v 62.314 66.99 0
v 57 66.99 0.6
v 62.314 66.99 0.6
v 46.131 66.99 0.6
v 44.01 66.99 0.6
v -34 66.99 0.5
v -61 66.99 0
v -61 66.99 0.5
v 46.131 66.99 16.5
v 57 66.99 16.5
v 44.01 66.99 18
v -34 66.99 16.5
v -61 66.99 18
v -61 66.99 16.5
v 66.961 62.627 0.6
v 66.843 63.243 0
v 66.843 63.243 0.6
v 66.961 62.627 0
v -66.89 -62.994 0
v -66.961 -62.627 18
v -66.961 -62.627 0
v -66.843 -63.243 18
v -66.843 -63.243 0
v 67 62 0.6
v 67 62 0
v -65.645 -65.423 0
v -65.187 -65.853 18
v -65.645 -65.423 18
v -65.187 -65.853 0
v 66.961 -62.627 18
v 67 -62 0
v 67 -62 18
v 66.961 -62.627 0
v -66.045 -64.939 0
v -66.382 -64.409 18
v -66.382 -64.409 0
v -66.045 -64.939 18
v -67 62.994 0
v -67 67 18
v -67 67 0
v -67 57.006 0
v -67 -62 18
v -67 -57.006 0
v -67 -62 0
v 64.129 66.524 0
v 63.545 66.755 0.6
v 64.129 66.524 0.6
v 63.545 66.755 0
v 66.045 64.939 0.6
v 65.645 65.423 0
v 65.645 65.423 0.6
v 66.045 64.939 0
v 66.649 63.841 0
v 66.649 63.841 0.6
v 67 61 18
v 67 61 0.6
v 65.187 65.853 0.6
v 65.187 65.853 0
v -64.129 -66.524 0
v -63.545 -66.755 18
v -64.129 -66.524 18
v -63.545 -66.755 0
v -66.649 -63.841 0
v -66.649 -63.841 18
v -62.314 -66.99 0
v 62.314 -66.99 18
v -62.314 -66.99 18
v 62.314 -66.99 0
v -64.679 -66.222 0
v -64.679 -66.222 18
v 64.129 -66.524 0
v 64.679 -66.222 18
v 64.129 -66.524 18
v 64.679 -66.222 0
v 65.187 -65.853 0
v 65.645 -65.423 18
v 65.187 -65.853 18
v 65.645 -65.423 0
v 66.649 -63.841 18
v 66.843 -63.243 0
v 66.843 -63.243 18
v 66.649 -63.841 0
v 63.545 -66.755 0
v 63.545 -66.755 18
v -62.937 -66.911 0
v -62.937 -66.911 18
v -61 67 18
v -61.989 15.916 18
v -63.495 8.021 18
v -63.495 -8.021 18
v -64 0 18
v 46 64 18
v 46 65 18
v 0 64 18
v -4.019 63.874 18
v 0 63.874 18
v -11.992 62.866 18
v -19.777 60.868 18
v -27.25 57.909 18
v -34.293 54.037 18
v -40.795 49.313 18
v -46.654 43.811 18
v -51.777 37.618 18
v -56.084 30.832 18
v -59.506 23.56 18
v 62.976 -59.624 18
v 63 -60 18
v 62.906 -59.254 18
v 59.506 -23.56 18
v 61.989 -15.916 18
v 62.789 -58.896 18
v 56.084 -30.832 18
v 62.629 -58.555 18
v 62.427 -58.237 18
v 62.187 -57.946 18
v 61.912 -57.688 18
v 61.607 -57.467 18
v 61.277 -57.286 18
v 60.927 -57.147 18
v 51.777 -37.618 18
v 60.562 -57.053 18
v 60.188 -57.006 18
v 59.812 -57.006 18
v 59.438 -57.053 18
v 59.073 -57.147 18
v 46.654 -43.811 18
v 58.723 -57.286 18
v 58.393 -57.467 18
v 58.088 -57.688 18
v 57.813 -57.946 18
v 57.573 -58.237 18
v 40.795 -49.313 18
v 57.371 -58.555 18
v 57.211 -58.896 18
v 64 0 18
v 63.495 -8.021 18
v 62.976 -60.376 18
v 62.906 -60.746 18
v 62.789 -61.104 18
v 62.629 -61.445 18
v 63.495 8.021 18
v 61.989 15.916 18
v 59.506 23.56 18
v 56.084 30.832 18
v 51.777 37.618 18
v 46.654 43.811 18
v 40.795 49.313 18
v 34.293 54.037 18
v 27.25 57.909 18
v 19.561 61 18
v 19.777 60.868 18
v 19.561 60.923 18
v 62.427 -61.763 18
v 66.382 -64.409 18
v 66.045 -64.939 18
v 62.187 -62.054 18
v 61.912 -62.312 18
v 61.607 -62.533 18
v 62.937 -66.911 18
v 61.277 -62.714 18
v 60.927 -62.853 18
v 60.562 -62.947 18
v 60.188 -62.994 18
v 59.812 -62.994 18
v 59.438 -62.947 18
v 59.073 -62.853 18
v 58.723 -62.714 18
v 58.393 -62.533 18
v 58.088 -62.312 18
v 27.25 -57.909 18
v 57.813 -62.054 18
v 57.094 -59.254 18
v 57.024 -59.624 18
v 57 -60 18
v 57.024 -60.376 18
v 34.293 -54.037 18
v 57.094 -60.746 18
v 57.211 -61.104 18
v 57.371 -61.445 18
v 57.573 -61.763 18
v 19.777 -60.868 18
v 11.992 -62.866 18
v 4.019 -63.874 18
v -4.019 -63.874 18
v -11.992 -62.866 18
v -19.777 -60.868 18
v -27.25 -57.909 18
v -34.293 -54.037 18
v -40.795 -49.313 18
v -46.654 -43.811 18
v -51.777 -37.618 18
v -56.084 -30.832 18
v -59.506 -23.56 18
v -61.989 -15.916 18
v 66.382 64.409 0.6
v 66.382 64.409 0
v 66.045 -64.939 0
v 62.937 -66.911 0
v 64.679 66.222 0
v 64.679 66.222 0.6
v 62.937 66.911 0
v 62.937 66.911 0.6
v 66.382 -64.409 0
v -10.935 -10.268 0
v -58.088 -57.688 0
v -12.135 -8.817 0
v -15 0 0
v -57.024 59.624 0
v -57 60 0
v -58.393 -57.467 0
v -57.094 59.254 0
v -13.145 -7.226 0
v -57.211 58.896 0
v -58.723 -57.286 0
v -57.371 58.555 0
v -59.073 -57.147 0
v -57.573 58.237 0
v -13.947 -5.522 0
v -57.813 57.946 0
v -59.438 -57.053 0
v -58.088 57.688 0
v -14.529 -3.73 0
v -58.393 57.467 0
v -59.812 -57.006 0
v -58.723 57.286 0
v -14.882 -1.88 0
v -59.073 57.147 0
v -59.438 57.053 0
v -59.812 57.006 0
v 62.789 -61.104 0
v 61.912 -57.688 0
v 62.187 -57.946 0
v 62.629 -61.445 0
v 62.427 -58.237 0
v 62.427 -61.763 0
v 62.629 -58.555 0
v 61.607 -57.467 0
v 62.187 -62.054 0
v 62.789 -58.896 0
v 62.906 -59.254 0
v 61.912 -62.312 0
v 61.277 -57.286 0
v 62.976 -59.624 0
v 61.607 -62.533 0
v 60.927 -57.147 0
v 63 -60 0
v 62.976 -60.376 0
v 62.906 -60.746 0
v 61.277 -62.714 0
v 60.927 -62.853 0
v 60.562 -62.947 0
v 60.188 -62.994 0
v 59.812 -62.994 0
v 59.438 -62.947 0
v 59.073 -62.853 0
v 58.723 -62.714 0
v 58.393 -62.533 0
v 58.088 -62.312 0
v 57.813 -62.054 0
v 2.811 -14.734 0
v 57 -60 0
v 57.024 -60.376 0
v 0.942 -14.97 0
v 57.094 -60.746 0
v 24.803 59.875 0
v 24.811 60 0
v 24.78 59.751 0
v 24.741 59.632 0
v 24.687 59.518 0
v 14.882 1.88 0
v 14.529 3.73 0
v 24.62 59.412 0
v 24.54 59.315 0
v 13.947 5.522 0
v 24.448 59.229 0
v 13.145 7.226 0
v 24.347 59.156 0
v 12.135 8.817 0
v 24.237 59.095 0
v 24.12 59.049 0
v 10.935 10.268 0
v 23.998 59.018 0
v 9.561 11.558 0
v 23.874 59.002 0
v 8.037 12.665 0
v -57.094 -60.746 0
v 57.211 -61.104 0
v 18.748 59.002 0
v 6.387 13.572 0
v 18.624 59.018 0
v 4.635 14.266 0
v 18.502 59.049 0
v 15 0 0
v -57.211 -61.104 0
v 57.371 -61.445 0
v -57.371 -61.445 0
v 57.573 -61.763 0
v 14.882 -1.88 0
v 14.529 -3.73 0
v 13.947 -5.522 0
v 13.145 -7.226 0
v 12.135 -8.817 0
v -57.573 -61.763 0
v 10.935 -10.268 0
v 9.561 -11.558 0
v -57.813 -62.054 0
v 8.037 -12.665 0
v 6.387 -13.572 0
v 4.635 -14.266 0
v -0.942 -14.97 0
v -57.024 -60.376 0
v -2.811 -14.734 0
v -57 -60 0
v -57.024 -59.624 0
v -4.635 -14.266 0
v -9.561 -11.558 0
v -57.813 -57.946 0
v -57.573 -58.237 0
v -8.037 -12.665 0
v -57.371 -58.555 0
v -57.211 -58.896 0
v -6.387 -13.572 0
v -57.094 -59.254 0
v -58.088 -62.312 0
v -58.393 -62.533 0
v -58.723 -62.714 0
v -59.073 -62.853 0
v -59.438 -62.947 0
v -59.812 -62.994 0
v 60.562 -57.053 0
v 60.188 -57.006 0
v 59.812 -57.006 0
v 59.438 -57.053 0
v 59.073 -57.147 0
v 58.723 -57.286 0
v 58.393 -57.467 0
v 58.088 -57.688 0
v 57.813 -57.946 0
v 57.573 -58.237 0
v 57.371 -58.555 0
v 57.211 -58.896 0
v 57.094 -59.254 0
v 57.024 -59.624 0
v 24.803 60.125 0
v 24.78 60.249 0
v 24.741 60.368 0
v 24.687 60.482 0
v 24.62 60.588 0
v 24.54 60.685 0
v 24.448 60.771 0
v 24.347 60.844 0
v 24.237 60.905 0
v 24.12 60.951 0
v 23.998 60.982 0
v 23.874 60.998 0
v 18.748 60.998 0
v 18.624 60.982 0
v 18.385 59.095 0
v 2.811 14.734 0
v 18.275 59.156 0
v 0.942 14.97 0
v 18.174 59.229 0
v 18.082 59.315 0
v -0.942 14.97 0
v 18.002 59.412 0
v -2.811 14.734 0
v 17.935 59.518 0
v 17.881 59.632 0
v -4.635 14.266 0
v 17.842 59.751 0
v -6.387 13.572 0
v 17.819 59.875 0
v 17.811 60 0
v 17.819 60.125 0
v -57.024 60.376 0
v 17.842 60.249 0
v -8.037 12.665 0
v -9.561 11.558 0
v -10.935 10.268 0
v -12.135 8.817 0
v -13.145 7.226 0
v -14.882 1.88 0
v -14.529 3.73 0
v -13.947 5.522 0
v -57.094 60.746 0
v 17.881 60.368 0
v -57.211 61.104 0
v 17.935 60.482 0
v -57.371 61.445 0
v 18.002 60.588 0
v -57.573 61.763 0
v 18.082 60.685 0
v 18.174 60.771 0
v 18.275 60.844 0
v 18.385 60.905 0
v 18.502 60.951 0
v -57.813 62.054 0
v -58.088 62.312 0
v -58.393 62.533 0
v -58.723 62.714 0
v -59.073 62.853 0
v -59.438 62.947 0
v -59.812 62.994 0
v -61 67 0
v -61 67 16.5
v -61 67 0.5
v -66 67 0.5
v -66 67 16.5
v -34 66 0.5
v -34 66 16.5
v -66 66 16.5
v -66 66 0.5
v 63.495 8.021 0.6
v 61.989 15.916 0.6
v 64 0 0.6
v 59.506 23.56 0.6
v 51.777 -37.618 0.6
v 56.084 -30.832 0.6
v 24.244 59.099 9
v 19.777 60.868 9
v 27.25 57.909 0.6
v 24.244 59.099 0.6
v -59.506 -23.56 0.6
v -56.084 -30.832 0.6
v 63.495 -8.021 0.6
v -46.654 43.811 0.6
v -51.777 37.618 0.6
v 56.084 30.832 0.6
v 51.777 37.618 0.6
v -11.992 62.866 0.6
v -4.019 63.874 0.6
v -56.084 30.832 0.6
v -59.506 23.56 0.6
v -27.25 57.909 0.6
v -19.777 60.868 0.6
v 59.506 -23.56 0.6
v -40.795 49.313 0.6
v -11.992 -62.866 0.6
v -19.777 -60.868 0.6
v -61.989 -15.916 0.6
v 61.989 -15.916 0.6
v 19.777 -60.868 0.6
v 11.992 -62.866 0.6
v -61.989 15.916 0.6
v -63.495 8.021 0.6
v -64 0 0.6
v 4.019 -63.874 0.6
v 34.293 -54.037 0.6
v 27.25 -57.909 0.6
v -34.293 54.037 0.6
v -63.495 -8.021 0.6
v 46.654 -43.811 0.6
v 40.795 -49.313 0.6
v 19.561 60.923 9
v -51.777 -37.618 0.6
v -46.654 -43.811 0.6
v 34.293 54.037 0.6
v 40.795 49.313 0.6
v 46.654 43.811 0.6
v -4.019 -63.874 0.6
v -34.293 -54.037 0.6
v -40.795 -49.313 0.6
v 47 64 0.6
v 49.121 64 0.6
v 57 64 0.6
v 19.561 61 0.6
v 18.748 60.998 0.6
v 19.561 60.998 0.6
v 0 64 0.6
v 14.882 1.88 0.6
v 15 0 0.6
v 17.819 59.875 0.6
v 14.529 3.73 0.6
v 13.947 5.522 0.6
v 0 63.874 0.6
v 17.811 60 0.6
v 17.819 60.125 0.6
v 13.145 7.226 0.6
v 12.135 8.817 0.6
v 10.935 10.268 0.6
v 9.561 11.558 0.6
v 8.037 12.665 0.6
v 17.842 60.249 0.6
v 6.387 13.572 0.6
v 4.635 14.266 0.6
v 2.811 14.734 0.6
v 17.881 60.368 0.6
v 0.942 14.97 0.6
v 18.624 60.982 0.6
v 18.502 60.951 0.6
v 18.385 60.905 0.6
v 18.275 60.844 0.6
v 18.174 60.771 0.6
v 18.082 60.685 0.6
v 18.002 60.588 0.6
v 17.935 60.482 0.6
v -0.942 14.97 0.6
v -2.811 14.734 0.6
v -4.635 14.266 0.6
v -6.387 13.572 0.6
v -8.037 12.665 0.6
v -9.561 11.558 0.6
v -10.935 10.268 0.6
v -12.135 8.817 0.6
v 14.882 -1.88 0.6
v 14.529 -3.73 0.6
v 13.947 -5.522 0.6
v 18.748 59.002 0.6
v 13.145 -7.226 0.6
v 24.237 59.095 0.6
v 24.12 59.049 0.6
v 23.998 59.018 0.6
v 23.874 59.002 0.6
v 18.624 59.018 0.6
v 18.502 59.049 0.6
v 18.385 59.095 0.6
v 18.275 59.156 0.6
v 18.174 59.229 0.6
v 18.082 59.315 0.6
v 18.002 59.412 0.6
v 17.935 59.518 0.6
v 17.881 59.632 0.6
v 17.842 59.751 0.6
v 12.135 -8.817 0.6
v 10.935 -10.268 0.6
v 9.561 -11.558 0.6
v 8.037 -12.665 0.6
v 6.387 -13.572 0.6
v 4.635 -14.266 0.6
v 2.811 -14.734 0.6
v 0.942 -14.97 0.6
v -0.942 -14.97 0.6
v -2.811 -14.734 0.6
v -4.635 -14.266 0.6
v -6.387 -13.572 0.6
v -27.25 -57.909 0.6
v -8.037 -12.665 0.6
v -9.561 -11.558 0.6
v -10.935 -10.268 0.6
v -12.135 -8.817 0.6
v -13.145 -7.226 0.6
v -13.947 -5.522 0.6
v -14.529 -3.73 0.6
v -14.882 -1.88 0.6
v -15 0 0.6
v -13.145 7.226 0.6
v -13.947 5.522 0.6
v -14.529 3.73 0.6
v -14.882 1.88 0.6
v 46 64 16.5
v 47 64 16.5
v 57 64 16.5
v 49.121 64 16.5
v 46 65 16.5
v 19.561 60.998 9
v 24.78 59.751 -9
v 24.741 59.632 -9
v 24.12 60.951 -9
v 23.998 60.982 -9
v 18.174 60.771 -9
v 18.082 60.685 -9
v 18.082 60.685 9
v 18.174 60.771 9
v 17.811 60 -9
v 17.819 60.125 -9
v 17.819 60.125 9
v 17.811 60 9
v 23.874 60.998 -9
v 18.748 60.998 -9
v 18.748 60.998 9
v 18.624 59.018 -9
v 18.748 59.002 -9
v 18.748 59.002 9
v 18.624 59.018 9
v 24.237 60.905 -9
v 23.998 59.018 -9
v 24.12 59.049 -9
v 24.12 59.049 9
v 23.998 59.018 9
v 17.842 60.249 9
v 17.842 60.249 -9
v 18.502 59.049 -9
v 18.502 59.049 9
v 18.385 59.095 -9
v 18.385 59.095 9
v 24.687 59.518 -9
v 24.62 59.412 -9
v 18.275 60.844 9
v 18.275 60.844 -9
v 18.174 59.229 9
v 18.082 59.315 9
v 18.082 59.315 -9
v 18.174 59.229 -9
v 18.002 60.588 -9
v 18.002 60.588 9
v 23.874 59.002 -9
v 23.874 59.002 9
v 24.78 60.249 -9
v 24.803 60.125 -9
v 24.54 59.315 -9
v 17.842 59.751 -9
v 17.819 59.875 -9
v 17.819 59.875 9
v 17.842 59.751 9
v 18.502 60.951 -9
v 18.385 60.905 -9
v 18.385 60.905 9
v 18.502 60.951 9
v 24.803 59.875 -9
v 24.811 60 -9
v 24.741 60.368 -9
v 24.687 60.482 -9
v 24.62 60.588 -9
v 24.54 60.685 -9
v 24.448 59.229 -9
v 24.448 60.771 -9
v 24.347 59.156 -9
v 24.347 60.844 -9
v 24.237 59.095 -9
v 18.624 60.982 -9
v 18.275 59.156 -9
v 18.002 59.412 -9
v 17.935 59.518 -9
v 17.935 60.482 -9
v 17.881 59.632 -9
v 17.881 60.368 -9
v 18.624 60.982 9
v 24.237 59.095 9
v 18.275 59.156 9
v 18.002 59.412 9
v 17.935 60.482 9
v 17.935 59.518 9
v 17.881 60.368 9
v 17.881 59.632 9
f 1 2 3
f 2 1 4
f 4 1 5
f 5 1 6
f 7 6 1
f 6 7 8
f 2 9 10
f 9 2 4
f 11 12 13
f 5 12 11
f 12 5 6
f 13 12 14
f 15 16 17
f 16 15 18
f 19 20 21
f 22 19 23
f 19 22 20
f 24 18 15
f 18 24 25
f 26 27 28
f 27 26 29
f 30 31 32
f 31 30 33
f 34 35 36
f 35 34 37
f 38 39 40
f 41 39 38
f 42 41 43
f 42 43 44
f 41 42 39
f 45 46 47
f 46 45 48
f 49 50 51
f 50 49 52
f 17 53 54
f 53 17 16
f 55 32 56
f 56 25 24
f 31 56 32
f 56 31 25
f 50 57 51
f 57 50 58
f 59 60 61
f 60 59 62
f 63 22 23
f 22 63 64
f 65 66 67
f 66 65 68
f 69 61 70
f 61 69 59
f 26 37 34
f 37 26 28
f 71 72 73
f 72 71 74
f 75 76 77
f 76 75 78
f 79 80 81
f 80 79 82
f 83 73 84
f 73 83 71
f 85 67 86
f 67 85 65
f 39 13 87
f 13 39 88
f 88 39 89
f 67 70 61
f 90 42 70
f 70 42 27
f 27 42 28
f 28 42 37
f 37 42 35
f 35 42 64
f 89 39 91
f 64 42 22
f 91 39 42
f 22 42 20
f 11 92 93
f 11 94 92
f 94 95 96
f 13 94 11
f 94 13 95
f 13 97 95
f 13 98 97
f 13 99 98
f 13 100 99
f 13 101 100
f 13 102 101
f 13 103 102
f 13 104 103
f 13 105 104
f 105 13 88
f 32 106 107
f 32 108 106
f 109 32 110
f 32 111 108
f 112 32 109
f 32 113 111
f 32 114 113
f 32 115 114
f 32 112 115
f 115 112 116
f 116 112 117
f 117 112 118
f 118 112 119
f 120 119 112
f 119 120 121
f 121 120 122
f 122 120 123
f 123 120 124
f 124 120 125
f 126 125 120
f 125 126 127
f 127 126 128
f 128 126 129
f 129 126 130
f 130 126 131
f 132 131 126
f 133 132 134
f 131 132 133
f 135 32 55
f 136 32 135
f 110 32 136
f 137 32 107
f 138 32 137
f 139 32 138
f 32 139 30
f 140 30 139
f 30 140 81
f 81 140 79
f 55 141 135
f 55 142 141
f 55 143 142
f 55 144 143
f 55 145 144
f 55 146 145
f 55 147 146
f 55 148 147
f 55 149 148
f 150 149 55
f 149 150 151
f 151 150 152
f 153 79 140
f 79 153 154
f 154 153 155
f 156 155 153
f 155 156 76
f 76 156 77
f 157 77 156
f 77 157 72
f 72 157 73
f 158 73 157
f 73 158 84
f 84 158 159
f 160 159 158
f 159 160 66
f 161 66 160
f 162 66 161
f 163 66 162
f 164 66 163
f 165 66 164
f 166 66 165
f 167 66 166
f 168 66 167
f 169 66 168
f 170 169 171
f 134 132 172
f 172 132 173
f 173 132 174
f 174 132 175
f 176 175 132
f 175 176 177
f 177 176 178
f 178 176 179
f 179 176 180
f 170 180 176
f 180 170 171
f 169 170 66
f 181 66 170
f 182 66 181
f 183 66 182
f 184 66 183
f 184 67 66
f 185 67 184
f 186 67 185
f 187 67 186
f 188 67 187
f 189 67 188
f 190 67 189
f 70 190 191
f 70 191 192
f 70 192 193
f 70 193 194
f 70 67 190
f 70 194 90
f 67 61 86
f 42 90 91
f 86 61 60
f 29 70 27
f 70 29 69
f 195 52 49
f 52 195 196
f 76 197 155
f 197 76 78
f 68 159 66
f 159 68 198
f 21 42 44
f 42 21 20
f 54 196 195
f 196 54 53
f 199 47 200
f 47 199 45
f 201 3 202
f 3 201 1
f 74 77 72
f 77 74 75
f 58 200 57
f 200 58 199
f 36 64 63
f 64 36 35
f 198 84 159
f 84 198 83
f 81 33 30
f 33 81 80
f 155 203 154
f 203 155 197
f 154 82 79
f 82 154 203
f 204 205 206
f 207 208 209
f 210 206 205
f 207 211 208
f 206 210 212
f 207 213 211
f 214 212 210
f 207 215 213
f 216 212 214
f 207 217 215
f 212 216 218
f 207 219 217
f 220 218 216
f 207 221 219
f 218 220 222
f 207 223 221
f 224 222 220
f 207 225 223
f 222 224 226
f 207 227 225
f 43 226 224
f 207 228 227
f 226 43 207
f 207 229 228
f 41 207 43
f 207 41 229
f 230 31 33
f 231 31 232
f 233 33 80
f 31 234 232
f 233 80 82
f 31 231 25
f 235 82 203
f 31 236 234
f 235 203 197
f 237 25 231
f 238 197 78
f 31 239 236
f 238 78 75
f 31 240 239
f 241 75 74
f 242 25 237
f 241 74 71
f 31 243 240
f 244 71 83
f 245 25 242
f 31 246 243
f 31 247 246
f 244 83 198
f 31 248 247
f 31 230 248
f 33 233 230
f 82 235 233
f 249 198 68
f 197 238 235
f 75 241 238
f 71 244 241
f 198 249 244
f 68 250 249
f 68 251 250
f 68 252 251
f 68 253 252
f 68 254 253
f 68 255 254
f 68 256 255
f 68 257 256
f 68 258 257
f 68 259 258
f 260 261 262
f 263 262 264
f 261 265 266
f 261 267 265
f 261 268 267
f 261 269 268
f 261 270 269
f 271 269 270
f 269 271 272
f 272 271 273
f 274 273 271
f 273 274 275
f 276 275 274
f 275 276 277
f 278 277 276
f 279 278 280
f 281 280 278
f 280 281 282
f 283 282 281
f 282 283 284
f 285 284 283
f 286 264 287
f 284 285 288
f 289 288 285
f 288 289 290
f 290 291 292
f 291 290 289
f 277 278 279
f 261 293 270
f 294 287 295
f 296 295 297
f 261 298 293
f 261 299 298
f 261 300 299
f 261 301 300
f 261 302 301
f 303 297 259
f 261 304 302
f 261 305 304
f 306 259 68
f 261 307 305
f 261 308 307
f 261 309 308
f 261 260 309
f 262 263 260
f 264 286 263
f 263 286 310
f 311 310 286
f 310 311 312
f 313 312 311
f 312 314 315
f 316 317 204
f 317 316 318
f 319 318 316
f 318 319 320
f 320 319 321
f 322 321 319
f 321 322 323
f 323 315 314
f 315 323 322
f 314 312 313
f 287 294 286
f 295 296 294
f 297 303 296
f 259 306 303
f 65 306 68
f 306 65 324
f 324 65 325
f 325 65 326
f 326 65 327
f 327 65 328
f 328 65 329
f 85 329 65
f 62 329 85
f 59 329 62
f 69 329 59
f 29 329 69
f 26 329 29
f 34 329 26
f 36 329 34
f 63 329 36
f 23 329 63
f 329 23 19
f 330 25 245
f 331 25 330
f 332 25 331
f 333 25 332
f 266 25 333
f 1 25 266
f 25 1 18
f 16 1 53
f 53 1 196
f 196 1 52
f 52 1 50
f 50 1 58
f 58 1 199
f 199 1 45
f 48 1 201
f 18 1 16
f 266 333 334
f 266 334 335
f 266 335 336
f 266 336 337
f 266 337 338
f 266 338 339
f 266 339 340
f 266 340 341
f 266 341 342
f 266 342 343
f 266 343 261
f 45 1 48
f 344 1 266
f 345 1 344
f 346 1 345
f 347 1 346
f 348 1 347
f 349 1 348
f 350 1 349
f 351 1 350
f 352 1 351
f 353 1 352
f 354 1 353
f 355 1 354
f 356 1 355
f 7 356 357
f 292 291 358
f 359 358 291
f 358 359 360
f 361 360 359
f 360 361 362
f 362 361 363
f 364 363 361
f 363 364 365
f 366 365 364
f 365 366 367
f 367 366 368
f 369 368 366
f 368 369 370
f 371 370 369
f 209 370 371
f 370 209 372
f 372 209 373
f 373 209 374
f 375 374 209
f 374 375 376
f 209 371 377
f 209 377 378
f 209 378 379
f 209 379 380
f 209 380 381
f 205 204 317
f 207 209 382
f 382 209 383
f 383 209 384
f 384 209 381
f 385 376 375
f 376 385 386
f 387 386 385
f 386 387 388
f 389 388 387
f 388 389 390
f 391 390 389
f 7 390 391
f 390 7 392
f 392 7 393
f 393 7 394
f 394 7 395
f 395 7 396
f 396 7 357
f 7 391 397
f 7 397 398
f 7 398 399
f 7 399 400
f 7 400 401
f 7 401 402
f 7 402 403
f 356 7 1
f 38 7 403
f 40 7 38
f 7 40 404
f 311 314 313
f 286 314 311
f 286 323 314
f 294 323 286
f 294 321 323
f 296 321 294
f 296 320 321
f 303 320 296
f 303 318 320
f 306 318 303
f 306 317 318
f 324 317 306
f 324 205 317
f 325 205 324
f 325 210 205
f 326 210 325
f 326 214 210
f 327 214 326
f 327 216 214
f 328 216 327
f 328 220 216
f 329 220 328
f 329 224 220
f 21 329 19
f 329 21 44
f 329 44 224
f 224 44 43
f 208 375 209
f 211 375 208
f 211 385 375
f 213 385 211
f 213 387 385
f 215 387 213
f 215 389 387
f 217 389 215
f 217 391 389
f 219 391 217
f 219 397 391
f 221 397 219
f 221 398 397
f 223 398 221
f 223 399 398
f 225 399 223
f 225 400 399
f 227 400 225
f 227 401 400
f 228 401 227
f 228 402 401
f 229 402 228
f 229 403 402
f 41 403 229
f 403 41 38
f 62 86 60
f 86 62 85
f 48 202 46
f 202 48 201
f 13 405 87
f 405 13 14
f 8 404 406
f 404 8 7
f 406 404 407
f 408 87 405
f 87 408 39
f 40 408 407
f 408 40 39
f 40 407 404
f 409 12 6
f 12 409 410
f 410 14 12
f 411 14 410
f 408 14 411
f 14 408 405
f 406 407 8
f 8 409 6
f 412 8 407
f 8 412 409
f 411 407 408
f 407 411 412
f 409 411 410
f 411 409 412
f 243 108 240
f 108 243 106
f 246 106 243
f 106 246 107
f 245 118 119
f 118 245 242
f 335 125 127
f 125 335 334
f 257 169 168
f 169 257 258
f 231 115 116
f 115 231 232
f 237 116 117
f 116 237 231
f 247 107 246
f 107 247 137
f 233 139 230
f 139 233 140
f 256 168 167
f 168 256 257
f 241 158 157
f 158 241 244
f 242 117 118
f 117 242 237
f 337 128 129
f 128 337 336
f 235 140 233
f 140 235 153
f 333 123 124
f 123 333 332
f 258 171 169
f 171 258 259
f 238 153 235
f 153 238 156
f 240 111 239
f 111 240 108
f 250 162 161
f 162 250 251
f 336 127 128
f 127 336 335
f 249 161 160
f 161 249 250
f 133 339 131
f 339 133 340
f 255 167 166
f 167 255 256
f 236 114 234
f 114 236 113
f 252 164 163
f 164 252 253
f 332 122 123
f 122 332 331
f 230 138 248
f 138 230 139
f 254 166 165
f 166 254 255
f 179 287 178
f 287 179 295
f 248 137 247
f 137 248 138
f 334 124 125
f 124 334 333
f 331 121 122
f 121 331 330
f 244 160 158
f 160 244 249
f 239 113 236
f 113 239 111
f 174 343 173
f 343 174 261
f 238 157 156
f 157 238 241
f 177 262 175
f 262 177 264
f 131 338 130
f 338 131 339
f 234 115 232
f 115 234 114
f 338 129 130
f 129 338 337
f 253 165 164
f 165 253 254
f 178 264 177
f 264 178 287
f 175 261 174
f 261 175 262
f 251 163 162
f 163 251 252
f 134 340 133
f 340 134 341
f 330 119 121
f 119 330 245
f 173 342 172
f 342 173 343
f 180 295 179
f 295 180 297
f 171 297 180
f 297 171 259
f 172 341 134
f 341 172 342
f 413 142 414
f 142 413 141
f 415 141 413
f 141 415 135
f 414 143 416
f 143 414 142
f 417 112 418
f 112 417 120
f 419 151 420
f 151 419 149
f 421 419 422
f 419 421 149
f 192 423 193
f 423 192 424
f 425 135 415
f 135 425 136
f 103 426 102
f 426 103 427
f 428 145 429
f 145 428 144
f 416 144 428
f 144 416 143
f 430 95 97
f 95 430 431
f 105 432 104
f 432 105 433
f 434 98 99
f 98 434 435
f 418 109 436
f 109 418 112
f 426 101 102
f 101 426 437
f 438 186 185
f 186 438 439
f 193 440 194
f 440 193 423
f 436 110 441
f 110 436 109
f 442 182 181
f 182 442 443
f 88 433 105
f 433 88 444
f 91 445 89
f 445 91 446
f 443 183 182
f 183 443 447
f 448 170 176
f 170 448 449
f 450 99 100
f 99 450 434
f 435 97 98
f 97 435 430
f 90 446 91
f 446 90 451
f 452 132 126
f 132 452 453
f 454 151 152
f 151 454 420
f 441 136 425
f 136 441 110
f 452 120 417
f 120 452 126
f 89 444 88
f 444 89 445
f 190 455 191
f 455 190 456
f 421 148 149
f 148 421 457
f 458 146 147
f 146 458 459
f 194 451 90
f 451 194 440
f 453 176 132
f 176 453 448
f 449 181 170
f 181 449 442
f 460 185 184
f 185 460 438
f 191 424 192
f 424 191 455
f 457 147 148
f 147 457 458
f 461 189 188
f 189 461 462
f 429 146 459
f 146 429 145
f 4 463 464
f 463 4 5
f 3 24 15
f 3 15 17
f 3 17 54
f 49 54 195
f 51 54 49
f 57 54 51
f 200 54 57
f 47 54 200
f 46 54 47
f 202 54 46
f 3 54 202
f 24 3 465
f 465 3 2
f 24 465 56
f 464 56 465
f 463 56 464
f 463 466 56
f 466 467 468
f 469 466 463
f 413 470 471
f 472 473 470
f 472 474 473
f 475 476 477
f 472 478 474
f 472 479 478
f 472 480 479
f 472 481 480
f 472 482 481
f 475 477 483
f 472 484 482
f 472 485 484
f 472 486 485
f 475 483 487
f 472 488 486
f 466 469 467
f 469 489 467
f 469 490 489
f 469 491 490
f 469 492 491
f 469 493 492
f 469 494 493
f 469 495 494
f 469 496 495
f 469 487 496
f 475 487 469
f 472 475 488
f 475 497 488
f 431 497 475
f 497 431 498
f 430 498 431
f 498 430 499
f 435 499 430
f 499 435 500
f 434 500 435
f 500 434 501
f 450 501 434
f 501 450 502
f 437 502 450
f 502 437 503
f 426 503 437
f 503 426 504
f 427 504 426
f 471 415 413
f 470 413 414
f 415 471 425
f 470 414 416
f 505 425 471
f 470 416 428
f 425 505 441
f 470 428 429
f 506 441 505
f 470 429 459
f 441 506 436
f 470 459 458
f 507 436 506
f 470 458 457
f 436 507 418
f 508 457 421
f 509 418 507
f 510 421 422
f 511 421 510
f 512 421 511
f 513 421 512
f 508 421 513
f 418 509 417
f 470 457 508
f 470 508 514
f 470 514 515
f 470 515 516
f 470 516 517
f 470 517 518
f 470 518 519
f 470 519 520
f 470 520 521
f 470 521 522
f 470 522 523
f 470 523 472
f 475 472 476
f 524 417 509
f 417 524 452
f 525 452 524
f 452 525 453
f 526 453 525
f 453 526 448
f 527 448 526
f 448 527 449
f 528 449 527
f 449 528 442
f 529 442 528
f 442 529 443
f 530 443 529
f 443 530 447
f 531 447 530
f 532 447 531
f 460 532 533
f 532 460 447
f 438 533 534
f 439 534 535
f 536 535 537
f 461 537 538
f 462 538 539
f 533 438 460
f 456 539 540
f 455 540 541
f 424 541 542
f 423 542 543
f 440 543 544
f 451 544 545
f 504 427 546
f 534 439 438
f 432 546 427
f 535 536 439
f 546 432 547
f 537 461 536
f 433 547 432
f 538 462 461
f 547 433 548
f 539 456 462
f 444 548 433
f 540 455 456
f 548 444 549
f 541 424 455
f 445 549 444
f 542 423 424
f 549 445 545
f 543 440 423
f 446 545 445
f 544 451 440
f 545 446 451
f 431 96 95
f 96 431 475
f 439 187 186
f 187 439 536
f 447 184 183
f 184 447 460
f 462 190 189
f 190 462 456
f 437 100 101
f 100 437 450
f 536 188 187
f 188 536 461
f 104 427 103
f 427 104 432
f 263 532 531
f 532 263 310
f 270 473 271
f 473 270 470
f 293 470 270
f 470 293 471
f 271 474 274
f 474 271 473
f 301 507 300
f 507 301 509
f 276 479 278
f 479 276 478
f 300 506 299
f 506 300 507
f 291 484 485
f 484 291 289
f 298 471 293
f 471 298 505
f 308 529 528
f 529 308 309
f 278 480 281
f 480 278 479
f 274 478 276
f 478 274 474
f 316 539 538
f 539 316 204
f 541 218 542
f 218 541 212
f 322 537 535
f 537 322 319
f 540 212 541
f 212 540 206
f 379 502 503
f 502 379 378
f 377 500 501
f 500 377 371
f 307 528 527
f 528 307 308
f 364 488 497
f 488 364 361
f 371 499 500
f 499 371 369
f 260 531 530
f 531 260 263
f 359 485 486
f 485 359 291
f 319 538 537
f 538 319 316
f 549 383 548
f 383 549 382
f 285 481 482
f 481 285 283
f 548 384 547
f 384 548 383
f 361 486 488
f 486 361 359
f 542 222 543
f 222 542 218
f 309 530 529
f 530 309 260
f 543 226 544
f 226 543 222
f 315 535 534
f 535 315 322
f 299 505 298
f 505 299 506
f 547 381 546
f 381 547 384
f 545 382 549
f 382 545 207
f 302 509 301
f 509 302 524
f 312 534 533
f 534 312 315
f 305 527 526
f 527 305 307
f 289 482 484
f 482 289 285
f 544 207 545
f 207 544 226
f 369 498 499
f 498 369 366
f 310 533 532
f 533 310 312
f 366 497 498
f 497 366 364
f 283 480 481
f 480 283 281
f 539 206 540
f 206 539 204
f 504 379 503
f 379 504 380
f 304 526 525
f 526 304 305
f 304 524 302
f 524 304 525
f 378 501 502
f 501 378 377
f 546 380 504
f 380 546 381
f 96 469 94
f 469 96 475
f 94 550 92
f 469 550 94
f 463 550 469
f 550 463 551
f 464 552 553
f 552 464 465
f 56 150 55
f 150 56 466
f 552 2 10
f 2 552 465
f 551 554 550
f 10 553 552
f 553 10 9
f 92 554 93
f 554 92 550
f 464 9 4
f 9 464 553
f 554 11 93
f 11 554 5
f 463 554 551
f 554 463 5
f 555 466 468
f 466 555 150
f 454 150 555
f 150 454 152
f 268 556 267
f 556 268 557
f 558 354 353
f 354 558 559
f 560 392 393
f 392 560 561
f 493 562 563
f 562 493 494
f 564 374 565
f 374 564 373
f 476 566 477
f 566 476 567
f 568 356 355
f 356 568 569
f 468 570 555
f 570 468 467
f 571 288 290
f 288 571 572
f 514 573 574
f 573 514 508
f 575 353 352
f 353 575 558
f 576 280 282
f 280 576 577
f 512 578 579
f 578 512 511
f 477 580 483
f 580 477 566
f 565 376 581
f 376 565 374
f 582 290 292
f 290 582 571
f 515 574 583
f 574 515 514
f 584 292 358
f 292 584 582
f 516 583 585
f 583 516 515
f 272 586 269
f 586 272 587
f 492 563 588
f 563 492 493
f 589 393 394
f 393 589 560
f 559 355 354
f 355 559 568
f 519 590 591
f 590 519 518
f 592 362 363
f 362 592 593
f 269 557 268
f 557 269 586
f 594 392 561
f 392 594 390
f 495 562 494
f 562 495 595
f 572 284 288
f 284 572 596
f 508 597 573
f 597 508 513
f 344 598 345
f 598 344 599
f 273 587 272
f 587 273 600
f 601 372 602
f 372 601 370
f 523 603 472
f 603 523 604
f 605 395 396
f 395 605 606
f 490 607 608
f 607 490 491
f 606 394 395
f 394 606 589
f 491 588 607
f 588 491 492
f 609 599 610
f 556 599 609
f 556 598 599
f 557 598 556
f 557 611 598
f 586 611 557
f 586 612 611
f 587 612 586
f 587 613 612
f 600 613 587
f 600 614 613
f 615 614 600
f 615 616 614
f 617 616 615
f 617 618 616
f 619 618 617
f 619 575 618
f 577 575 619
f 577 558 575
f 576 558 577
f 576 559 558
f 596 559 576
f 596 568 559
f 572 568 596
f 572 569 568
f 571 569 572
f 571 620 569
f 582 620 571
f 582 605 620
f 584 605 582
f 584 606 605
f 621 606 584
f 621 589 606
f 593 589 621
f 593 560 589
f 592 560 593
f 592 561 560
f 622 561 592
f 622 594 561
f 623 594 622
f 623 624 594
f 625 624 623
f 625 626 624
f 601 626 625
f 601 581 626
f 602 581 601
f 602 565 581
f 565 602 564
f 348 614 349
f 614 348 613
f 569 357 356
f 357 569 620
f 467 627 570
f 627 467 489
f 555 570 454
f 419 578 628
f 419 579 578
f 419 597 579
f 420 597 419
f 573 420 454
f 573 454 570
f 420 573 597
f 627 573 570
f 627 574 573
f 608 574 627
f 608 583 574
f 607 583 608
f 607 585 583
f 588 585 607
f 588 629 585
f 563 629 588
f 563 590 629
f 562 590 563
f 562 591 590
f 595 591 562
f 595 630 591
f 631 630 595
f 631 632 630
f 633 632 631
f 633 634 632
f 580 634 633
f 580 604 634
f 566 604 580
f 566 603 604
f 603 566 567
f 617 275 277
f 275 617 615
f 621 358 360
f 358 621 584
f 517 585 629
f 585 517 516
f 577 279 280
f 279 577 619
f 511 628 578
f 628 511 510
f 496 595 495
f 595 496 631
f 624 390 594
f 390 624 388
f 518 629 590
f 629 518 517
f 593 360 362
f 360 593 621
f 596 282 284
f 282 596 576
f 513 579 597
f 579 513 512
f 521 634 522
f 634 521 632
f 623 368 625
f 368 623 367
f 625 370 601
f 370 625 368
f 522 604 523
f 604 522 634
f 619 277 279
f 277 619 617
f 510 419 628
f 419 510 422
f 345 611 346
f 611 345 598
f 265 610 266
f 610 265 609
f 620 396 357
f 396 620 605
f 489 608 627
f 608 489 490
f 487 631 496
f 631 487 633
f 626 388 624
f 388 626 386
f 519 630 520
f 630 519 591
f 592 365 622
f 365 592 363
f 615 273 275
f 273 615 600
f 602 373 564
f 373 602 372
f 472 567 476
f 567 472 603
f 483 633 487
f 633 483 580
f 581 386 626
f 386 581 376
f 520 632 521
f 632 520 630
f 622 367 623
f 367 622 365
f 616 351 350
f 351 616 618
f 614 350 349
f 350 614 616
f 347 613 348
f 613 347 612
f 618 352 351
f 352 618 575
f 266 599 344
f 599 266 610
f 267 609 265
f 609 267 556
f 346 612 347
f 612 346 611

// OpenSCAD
$fn = 50;


union() {
	difference() {
		union() {
			hull() {
				translate(v = [-62.0000000000, 62.0000000000, 0]) {
					cylinder(h = 18, r = 5);
				}
				translate(v = [62.0000000000, 62.0000000000, 0]) {
					cylinder(h = 18, r = 5);
				}
				translate(v = [-62.0000000000, -62.0000000000, 0]) {
					cylinder(h = 18, r = 5);
				}
				translate(v = [62.0000000000, -62.0000000000, 0]) {
					cylinder(h = 18, r = 5);
				}
			}
			translate(v = [-67.0000000000, 61.0000000000, 0]) {
				cube(size = [6, 6, 18]);
			}
		}
		union() {
			translate(v = [-67.5000000000, -60.0000000000, -250.0000000000]) {
				rotate(a = [0, 0, 0]) {
					difference() {
						union() {
							hull() {
								translate(v = [7.5000000000, 0, 0]) {
									cylinder(h = 250, r = 3.0000000000, r1 = 3.0000000000, r2 = 3.0000000000);
								}
								translate(v = [-7.5000000000, 0, 0]) {
									cylinder(h = 250, r = 3.0000000000, r1 = 3.0000000000, r2 = 3.0000000000);
								}
							}
						}
						union();
					}
				}
			}
			translate(v = [-67.5000000000, 60.0000000000, -250.0000000000]) {
				rotate(a = [0, 0, 0]) {
					difference() {
						union() {
							hull() {
								translate(v = [7.5000000000, 0, 0]) {
									cylinder(h = 250, r = 3.0000000000, r1 = 3.0000000000, r2 = 3.0000000000);
								}
								translate(v = [-7.5000000000, 0, 0]) {
									cylinder(h = 250, r = 3.0000000000, r1 = 3.0000000000, r2 = 3.0000000000);
								}
							}
						}
						union();
					}
				}
			}
			translate(v = [-66.0000000000, 66.0000000000, 0.5000000000]) {
				cube(size = [32, 1, 16]);
			}
			translate(v = [60.0000000000, -60.0000000000, 0]) {
				cylinder(h = 100, r = 3.0000000000);
			}
			translate(v = [0, 0, 0.6000000000]) {
				cylinder(h = 20.4000000000, r = 64.0000000000);
			}
			translate(v = [0, 0, -9.0000000000]) {
				cylinder(h = 18, r = 15.0000000000);
			}
			translate(v = [0.0000000000, 61.0000000000, 0.6000000000]) {
				cube(size = [67.0000000000, 3, 20.4000000000]);
			}
			translate(v = [57.0000000000, 61.0000000000, 0.6000000000]) {
				cube(size = [10, 6, 20.4000000000]);
			}
			translate(v = [46.0000000000, 61.0000000000, 16.5000000000]) {
				cube(size = [21, 6, 1.5000000000]);
			}
			translate(v = [43.2500000000, 67.7500000000, 0.6000000000]) {
				rotate(a = [0, 0, -45]) {
					cube(size = [7.5000000000, 1.5000000000, 20.4000000000]);
				}
			}
			translate(v = [12.0610000000, 59.0000000000, 0.6000000000]) {
				cube(size = [7.5000000000, 2, 17.4000000000]);
			}
		}
	}
	union() {
		translate(v = [21.3110000000, 60.0000000000, -9.0000000000]) {
			rotate(a = [0, 0, 0]) {
				difference() {
					union() {
						#hull() {
							#translate(v = [2.5000000000, 0, 0]) {
								cylinder(h = 18, r = 1.0000000000, r1 = 1.0000000000, r2 = 1.0000000000);
							}
							#translate(v = [-2.5000000000, 0, 0]) {
								cylinder(h = 18, r = 1.0000000000, r1 = 1.0000000000, r2 = 1.0000000000);
							}
						}
					}
					union();
				}
			}
		}
	}
}
